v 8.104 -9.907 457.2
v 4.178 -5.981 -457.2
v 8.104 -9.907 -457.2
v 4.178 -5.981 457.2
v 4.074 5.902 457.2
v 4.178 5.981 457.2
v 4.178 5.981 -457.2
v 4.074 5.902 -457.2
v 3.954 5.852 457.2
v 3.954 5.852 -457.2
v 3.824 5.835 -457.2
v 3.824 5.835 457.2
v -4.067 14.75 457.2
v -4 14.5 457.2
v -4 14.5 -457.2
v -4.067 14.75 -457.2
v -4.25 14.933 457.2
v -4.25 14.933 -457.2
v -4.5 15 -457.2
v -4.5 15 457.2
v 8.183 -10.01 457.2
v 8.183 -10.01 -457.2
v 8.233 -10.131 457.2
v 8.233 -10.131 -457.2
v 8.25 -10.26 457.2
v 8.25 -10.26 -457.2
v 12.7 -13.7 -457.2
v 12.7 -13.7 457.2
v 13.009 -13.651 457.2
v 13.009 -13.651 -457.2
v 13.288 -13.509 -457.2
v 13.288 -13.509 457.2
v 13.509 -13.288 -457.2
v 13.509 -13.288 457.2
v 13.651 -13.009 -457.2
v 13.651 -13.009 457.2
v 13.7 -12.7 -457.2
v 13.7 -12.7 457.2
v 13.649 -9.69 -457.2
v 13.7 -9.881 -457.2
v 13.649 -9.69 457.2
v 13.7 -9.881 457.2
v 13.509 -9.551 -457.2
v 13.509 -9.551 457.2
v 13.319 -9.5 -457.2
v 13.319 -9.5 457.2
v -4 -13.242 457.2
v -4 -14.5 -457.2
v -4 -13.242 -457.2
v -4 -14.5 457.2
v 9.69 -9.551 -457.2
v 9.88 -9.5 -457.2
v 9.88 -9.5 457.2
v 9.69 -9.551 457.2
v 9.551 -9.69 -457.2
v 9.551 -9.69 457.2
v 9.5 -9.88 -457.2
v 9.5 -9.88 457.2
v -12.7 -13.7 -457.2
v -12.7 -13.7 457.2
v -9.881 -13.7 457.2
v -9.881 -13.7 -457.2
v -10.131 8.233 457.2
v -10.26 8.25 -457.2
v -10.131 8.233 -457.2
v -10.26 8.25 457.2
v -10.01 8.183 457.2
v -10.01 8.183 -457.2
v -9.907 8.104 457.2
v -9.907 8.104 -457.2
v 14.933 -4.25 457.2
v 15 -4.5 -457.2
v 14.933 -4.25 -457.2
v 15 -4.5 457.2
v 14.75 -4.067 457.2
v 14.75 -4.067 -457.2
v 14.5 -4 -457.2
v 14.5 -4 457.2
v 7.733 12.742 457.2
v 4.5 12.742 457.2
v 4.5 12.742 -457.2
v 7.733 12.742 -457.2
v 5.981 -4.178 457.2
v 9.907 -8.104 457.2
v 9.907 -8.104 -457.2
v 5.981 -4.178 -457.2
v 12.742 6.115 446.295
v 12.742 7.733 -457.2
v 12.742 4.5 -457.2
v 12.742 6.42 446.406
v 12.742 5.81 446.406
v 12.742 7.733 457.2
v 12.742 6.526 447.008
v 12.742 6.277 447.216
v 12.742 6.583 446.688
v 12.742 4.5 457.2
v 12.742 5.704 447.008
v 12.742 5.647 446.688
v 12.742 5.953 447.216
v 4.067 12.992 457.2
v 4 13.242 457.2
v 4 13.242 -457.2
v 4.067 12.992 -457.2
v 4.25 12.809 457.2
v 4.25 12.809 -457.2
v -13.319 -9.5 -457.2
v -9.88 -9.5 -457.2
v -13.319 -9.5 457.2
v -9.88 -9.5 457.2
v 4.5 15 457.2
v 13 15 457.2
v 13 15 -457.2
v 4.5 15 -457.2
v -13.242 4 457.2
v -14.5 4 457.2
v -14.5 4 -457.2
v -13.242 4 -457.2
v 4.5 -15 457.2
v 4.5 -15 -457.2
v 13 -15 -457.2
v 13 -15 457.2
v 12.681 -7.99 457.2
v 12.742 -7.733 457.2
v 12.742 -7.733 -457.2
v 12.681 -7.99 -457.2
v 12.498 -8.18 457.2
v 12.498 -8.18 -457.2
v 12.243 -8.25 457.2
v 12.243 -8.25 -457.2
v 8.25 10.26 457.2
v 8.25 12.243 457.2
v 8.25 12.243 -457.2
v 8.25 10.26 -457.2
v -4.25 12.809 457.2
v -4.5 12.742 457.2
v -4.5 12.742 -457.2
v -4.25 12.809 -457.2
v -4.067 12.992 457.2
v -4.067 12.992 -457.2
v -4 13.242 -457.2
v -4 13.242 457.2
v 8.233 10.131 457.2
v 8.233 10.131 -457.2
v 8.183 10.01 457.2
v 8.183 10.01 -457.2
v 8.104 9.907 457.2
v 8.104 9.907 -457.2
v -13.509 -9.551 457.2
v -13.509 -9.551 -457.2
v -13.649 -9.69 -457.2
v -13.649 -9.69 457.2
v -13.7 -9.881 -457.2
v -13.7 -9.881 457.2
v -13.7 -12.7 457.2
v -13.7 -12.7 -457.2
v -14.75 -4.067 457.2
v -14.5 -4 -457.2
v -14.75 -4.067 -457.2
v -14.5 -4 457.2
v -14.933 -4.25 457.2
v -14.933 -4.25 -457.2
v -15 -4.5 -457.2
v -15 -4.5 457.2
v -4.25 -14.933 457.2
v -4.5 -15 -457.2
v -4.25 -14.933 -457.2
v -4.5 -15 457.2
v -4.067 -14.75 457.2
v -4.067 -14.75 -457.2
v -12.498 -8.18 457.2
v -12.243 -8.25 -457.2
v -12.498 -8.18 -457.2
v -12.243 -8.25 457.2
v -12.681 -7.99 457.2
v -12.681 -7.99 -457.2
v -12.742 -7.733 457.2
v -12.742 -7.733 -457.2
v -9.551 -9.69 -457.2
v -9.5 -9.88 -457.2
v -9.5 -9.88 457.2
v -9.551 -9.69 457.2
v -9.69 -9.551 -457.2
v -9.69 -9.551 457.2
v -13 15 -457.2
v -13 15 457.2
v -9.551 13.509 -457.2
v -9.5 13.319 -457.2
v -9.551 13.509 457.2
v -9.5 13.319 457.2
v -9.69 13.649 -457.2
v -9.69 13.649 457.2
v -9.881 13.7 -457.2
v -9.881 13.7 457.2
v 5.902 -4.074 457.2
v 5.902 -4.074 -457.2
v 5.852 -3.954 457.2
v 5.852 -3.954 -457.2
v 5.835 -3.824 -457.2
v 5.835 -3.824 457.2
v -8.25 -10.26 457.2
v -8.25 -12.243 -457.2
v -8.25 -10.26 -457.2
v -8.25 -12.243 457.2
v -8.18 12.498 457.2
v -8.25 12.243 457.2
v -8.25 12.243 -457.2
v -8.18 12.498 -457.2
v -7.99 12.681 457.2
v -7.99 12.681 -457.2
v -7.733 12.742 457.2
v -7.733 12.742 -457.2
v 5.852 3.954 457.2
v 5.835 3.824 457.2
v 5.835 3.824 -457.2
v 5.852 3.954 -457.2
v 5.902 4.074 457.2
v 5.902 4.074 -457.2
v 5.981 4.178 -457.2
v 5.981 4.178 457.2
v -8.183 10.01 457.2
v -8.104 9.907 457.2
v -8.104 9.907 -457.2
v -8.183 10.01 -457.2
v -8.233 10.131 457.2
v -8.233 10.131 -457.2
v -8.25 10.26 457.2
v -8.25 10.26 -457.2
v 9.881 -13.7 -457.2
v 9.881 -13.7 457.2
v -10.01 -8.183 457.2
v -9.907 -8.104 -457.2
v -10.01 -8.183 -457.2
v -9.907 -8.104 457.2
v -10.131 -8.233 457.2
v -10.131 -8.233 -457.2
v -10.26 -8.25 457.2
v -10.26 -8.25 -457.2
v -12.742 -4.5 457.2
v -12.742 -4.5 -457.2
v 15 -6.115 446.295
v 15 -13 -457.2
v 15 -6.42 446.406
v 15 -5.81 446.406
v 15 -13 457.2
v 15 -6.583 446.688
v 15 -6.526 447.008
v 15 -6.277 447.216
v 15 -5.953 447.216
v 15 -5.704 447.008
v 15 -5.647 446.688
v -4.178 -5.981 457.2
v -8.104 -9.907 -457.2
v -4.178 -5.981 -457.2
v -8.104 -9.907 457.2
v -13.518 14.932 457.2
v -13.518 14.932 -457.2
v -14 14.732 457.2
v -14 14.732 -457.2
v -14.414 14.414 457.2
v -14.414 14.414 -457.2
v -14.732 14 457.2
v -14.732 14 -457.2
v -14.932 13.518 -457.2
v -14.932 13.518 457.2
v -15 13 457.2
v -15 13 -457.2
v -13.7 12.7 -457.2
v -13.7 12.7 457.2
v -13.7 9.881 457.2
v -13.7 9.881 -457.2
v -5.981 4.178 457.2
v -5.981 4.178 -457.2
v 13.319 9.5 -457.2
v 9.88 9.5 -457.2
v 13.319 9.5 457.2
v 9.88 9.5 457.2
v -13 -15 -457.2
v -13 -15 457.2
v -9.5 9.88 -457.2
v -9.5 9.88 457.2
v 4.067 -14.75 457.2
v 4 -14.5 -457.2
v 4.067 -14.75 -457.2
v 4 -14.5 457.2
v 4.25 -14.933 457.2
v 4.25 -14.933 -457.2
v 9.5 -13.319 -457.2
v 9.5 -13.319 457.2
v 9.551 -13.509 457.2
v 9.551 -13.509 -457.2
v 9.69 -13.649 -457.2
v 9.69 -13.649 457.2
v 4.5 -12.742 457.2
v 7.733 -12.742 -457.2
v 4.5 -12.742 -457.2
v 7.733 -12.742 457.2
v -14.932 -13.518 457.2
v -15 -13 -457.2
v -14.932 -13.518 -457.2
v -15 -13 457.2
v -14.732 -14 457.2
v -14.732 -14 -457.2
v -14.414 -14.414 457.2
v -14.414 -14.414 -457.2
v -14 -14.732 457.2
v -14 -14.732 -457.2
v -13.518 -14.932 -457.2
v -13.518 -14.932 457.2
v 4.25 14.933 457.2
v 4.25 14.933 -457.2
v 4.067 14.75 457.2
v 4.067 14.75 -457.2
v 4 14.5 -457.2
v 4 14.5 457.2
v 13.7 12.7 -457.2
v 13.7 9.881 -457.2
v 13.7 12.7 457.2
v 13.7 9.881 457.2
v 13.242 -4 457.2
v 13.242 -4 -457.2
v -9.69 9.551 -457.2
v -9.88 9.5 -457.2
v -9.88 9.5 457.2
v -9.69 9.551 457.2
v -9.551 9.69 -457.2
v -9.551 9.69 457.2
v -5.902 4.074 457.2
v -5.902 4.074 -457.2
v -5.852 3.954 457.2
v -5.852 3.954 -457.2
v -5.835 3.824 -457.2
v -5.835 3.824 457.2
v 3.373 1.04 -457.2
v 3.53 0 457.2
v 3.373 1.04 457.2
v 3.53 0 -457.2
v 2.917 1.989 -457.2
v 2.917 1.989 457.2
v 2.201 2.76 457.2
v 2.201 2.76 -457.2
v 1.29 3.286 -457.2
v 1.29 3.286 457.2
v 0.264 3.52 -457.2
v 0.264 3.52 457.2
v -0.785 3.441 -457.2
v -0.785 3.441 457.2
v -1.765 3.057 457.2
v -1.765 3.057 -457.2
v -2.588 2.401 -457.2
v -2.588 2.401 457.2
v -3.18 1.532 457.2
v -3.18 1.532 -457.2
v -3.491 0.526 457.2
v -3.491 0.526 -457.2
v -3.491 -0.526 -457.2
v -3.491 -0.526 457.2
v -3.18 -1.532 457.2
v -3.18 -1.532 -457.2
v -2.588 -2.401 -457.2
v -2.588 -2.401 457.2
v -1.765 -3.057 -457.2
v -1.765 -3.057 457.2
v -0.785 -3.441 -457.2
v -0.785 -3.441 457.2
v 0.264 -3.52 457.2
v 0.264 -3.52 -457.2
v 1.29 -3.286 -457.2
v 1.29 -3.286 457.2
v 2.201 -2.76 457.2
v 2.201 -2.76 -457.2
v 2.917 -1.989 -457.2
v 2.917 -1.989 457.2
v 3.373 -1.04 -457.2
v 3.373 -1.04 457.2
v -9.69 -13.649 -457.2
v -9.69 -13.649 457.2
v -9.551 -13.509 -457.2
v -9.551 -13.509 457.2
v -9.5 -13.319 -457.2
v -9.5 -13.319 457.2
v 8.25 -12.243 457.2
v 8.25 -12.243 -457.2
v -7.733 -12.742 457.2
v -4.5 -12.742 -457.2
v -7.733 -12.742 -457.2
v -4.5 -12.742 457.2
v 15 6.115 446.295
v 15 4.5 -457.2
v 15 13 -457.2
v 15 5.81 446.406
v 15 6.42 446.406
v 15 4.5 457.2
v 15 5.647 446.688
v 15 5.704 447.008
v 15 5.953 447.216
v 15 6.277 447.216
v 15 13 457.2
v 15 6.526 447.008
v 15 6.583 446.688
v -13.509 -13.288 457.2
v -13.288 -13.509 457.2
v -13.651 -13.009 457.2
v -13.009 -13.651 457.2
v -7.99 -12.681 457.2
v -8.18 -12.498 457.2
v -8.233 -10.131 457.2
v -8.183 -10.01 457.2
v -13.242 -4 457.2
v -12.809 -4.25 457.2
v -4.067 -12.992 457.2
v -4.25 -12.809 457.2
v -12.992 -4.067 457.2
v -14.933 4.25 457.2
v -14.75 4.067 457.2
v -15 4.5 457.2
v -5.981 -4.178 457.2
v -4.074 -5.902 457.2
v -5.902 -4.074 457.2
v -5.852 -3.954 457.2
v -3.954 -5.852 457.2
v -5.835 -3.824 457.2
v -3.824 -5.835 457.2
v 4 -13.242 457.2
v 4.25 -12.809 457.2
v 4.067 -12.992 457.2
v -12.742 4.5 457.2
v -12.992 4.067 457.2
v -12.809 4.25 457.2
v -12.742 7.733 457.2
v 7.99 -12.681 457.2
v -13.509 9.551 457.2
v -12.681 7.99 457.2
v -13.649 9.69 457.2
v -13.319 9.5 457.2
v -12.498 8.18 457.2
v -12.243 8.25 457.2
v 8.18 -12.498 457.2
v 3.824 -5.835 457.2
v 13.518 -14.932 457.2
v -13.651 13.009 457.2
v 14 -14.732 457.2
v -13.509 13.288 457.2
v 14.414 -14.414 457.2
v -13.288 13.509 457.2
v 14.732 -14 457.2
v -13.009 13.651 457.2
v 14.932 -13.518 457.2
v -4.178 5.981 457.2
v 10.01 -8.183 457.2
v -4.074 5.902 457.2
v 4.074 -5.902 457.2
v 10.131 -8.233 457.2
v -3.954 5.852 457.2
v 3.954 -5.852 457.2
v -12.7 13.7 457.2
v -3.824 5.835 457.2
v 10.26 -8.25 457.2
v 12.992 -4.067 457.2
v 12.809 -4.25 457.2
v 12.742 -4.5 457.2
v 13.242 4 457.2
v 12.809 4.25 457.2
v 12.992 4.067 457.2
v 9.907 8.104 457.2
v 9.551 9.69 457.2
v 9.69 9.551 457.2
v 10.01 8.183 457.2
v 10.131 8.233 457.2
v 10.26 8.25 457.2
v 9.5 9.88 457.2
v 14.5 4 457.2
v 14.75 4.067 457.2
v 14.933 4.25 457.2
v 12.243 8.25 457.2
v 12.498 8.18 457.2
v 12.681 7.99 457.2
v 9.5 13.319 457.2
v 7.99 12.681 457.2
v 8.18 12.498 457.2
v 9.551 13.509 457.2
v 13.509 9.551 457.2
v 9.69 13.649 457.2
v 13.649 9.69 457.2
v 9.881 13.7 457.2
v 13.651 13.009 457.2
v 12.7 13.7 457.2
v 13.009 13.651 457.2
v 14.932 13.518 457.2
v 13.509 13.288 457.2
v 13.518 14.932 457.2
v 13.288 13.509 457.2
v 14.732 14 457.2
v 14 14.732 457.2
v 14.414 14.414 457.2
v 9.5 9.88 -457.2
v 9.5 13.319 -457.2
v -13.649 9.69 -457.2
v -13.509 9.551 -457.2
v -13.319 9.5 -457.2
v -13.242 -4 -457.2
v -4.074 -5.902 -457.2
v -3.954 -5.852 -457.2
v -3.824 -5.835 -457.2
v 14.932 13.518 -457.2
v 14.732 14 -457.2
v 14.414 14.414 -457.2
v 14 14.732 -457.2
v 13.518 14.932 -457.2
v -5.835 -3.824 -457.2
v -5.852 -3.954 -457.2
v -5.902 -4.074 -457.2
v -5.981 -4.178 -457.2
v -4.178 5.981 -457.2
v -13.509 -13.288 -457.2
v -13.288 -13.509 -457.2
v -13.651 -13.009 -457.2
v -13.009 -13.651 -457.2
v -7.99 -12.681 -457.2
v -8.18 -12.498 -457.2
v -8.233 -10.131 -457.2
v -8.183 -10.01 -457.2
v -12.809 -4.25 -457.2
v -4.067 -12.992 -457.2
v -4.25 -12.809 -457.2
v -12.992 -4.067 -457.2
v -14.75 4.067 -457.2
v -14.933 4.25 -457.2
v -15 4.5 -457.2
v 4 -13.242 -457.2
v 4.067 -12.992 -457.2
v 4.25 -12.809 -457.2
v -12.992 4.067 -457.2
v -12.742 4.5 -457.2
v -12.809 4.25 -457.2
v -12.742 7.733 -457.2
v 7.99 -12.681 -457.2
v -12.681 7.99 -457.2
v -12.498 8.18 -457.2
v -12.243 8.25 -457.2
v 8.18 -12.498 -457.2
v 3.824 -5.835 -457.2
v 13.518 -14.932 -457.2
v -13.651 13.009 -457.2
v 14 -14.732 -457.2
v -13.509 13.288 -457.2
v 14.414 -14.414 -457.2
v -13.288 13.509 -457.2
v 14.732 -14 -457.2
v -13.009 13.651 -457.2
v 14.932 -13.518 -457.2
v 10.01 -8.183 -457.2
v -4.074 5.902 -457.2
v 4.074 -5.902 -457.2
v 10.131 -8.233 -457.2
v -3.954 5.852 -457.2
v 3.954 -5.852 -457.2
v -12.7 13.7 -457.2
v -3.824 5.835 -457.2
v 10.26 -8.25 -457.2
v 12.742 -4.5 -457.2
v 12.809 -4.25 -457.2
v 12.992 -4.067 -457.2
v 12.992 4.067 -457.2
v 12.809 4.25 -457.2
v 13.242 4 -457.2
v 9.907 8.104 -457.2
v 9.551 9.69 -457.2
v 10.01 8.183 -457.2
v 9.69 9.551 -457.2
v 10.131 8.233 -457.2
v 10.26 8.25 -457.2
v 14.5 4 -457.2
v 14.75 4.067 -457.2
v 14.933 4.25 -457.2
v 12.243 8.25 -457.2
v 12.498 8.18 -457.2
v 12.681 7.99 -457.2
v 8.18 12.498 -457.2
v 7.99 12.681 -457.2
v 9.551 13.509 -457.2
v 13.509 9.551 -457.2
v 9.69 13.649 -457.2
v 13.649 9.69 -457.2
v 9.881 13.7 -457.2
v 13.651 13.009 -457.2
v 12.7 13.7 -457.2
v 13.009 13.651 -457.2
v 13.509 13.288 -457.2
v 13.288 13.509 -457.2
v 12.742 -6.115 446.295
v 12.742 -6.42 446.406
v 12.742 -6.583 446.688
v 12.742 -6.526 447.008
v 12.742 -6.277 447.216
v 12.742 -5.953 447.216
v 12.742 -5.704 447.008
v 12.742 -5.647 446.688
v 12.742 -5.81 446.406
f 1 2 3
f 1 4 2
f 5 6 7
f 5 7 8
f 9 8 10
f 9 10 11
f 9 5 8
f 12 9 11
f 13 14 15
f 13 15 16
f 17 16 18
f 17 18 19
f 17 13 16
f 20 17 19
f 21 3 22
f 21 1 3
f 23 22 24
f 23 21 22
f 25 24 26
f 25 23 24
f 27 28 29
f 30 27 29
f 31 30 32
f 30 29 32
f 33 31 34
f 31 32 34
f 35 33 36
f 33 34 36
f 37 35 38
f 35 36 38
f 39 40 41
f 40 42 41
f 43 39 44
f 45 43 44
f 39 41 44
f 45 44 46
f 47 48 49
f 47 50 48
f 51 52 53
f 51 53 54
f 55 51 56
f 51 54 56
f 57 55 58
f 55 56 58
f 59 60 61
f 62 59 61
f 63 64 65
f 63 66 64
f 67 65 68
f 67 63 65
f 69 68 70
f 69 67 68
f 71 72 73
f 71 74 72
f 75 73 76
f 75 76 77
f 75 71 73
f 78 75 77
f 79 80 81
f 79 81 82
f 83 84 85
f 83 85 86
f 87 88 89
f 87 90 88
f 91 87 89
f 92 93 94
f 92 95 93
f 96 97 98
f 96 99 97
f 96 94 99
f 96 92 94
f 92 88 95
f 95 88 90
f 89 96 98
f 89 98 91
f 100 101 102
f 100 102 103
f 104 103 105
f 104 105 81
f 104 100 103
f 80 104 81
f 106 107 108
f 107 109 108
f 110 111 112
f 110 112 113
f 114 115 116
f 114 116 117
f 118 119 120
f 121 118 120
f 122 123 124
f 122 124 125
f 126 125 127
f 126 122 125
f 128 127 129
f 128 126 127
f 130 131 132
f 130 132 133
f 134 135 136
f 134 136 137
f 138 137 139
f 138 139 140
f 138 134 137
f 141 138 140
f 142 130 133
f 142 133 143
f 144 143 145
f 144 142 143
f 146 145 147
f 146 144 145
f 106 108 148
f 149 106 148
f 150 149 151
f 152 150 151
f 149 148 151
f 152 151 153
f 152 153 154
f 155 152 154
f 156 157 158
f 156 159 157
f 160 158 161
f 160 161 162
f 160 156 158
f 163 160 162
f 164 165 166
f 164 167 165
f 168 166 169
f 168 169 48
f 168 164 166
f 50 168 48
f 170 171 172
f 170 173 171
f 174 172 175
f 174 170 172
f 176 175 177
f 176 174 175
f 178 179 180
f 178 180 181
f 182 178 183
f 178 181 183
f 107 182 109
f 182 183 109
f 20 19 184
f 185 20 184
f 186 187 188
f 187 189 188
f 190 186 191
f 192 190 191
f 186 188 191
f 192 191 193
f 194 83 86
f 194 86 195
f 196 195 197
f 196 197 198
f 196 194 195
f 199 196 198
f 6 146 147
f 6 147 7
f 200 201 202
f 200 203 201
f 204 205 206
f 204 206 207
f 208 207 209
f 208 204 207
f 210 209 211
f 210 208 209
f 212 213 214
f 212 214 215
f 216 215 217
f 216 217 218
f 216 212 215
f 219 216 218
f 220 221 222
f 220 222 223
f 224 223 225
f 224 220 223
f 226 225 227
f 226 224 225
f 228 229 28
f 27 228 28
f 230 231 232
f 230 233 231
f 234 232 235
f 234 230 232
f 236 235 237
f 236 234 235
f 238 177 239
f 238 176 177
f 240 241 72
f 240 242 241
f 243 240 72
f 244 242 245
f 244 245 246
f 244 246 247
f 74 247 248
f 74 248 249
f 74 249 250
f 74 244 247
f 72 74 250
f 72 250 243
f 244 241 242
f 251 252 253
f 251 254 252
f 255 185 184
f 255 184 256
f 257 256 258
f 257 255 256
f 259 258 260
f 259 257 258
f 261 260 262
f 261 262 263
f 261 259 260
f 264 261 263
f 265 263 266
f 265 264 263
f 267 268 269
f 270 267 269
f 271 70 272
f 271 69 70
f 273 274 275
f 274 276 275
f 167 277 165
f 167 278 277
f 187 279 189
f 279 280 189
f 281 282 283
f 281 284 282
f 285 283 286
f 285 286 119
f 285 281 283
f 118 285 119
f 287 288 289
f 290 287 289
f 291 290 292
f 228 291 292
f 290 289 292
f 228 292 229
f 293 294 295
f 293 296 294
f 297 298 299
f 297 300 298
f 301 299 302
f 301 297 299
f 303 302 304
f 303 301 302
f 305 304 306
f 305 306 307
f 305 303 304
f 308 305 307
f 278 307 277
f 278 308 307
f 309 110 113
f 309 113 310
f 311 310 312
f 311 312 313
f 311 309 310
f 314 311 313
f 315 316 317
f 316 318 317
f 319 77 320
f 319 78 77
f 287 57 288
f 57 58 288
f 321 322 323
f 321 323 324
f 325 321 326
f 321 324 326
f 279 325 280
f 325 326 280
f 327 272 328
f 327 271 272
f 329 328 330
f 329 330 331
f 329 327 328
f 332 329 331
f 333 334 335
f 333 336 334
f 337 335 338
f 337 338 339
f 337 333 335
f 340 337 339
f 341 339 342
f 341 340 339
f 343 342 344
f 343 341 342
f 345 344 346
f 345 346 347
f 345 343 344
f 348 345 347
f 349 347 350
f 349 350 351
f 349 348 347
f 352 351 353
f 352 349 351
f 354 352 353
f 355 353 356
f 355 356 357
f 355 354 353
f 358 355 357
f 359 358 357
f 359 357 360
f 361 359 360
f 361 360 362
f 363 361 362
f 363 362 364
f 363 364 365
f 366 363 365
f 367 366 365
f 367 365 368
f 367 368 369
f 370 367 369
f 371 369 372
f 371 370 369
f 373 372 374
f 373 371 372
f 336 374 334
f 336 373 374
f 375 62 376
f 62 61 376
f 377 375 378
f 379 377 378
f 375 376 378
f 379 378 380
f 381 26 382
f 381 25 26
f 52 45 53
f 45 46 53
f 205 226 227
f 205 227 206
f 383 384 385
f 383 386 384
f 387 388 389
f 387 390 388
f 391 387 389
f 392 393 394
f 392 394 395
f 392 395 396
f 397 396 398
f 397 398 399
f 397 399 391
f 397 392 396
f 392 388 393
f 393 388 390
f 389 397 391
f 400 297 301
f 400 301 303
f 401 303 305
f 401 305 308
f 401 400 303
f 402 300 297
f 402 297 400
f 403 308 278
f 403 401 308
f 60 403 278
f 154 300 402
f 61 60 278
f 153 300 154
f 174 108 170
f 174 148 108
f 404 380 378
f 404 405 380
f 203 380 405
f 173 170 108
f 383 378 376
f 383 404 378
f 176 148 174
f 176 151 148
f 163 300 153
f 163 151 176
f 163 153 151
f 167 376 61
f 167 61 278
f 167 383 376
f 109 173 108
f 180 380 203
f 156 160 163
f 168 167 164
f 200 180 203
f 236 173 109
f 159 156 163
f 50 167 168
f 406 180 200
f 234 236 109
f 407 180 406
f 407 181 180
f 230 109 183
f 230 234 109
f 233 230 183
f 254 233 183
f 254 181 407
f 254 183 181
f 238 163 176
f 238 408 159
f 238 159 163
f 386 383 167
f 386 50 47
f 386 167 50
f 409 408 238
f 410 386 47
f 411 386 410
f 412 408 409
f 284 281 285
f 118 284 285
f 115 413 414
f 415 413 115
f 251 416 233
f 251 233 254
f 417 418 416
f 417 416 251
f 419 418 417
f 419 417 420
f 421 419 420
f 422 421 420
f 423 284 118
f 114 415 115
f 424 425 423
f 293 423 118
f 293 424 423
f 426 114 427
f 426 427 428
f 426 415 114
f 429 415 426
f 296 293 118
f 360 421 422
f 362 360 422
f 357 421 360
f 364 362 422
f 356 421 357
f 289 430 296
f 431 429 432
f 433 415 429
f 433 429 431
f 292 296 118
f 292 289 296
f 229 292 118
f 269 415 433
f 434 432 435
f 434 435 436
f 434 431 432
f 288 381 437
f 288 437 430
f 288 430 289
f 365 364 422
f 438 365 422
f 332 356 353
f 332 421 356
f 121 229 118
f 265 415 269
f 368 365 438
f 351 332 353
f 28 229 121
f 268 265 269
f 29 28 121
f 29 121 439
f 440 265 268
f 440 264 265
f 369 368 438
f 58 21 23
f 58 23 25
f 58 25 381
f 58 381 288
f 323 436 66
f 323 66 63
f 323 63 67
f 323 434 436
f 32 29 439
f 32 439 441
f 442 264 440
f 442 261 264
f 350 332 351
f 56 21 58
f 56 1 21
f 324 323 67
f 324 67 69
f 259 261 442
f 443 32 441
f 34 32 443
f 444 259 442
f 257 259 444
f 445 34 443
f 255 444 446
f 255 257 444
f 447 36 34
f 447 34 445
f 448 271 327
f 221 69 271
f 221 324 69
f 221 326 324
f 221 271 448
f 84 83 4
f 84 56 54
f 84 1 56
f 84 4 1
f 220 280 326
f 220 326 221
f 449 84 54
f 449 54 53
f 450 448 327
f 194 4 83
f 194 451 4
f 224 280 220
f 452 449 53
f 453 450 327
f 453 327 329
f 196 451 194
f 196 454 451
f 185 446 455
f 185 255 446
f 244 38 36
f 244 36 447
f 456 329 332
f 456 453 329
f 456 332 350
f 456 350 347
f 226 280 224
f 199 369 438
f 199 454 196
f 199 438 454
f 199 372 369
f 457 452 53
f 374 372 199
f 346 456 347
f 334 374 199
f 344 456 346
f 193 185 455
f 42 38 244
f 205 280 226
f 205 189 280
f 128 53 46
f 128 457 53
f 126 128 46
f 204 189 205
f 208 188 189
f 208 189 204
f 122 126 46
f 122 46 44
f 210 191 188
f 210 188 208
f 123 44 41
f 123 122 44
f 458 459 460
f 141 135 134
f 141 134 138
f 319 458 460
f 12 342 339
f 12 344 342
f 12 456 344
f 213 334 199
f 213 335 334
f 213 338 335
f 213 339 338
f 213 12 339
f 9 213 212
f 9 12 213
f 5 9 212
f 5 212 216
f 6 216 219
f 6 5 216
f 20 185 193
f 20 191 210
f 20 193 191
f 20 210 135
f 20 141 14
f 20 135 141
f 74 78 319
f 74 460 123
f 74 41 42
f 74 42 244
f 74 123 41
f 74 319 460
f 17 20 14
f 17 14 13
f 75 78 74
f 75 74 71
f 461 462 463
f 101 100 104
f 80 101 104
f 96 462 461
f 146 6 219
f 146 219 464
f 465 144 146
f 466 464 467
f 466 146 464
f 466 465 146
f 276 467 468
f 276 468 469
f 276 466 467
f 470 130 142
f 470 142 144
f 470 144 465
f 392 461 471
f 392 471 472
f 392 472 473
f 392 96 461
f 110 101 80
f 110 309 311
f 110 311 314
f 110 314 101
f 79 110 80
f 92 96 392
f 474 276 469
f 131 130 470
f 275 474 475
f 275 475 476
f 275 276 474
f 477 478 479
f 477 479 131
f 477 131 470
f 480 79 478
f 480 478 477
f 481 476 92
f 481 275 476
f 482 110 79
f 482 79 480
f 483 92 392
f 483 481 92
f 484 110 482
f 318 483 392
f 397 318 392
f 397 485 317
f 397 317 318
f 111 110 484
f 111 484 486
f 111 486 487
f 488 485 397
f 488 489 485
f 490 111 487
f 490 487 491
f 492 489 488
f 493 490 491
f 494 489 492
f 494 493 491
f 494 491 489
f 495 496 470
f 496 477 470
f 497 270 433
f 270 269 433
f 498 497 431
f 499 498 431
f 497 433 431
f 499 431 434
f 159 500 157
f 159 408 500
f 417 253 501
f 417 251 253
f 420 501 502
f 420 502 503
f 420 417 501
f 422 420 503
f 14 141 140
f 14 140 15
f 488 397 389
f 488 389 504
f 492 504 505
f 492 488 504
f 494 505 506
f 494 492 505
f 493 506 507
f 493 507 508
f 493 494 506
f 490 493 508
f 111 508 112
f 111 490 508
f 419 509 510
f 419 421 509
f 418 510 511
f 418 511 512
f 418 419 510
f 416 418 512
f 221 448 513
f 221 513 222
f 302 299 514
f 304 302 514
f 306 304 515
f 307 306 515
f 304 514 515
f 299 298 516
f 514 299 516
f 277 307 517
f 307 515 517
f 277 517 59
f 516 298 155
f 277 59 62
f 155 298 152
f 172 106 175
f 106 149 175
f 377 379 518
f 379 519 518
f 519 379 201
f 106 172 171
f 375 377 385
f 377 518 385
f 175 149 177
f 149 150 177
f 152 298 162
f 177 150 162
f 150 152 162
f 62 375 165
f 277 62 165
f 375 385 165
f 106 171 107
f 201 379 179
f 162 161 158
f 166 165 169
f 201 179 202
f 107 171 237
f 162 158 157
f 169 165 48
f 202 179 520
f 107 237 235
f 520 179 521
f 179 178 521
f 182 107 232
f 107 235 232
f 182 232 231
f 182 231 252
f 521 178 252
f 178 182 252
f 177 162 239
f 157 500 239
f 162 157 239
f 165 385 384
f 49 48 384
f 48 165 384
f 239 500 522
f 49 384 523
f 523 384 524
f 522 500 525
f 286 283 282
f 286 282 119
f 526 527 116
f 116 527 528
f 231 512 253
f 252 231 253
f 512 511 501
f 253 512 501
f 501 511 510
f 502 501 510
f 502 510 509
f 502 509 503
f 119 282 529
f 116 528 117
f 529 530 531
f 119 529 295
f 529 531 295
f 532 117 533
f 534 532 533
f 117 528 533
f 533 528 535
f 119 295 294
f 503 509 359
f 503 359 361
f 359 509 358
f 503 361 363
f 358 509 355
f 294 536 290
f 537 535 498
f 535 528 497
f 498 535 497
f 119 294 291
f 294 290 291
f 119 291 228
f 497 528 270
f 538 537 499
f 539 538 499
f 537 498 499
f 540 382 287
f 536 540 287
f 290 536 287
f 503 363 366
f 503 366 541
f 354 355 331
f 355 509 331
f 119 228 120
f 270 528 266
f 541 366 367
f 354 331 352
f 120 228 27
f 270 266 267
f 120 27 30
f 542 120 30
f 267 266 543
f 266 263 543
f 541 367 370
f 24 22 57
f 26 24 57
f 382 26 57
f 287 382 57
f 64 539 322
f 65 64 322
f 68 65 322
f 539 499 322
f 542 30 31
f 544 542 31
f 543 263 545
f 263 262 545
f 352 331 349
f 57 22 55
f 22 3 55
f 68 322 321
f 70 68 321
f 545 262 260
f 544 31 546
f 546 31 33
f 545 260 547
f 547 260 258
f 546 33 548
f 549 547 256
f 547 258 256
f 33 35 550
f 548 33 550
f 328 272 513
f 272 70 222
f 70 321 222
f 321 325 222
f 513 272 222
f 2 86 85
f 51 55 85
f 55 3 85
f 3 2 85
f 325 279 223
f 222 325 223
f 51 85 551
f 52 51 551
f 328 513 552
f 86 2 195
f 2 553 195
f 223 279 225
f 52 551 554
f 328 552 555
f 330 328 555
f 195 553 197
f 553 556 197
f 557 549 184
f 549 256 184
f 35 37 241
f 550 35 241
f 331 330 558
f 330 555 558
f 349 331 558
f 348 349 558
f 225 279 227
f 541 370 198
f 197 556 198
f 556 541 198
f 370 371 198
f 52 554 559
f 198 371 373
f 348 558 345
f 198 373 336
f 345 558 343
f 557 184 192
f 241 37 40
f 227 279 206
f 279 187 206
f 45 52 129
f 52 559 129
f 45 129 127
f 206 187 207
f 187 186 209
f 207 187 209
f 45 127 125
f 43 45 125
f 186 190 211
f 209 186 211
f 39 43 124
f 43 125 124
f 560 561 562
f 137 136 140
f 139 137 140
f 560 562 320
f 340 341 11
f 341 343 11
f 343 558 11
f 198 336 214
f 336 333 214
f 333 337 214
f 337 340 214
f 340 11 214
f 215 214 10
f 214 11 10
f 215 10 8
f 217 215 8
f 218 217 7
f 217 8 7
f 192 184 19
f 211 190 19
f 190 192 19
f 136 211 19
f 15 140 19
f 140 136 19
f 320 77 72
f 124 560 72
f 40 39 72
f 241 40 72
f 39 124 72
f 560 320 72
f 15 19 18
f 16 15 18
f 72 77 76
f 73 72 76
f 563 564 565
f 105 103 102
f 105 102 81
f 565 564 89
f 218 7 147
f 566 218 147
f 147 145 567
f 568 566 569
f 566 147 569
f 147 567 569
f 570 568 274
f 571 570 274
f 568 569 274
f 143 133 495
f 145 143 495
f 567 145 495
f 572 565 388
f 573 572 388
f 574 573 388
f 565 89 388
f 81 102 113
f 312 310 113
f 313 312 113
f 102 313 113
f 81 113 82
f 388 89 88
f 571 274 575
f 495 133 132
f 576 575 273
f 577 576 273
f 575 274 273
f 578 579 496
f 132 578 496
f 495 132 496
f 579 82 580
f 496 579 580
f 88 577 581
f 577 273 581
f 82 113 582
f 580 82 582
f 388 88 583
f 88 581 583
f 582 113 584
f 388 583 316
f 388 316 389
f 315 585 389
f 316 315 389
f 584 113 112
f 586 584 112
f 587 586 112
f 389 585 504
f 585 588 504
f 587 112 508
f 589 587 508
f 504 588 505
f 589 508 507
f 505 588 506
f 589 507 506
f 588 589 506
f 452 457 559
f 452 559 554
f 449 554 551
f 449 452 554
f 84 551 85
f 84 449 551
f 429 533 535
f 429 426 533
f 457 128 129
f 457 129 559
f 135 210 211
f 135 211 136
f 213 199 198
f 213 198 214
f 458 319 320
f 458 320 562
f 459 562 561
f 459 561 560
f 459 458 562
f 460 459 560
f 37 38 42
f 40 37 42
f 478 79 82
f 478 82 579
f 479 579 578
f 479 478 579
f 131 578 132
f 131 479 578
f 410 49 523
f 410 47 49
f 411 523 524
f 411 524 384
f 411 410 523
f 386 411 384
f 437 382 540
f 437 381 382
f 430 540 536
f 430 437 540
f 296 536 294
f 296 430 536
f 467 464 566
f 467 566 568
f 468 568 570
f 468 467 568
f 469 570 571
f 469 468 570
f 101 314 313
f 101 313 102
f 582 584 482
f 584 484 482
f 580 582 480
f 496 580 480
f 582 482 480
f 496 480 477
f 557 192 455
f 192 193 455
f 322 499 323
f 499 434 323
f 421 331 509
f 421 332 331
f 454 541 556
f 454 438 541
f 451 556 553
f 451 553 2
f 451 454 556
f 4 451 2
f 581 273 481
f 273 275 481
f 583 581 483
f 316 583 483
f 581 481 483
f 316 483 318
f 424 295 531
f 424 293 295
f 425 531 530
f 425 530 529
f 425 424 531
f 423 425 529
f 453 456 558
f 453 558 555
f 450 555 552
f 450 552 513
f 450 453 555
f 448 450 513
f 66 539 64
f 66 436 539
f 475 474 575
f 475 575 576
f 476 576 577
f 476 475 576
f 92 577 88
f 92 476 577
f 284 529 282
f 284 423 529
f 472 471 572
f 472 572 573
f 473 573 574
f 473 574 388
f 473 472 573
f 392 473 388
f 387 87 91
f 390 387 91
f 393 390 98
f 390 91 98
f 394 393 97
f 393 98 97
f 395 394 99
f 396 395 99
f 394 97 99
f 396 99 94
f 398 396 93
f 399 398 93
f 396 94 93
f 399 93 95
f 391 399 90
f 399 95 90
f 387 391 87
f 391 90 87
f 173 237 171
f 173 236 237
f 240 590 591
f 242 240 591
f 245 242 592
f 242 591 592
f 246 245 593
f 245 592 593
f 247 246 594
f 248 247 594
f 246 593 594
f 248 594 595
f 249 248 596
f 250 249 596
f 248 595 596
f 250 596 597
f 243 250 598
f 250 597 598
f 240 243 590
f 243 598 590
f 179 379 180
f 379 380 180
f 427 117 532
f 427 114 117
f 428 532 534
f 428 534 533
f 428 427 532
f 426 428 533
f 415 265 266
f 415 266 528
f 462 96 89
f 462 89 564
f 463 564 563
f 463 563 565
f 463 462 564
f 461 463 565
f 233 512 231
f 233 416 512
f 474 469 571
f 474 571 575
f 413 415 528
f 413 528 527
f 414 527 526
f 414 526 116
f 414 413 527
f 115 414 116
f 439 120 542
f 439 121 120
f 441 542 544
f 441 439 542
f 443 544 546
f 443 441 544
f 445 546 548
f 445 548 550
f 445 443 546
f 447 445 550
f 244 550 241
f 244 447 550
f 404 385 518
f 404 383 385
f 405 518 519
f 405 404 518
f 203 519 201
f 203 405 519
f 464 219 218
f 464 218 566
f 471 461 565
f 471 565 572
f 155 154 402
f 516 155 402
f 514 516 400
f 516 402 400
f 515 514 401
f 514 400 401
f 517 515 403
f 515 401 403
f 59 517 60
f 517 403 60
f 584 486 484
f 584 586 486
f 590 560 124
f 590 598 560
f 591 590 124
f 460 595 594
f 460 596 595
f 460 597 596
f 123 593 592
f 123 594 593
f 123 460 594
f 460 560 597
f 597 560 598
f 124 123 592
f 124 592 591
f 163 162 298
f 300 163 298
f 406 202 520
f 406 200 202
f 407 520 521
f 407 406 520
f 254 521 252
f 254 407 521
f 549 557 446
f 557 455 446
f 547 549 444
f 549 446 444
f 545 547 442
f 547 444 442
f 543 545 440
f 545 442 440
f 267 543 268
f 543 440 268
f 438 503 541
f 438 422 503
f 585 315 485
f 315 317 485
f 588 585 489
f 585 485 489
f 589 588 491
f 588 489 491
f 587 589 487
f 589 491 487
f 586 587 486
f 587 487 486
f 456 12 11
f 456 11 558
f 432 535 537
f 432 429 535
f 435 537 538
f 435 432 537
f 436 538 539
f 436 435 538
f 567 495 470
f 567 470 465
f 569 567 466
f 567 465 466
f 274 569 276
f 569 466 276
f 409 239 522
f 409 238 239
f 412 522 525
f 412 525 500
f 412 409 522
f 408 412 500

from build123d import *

# Parameters (mm, degrees)
SKETCH1_R                    = 3.52998588
BOSS_EXTRUDE1_DEPTH          = 457.2
M1_2X0_25_TAPPED_HOLE1_D     = 0.95
M1_2X0_25_TAPPED_HOLE1_DEPTH = 2.25746535


with BuildPart() as part:
    # Sketch1 → Boss-Extrude1 (new, symmetric)
    with BuildSketch(Plane.XY):
        with BuildLine():
            Line((14.49994, -4), (13.24247465, -4))
            ThreePointArc((13.24247465, -4), (12.88892126, -4.146446609), (12.74247465, -4.5))
            Line((12.74247465, -4.5), (12.74247465, -7.732519321))
            ThreePointArc((12.74247465, -7.732519321), (12.602449697, -8.097296796), (12.242781236, -8.249967))
            Line((12.242781236, -8.249967), (10.260188032, -8.249967))
            ThreePointArc((10.260188032, -8.249967), (10.068847082, -8.211906919), (9.906636056, -8.103520976))
            Line((9.906636056, -8.103520976), (5.981117769, -4.178002689))
            ThreePointArc((5.981117769, -4.178002689), (5.872731827, -4.015791664), (5.834671745, -3.824450713))
            Line((5.834671745, -3.824450713), (5.834671745, -1.01249595))
            Line((5.834671745, -1.01249595), (5.834671745, 0.88749645))
            Line((5.834671745, 0.88749645), (5.834671745, 3.824450713))
            ThreePointArc((5.834671745, 3.824450713), (5.872731827, 4.015791664), (5.981117769, 4.178002689))
            Line((5.981117769, 4.178002689), (9.906636056, 8.103520976))
            ThreePointArc((9.906636056, 8.103520976), (10.068847082, 8.211906919), (10.260188032, 8.249967))
            Line((10.260188032, 8.249967), (12.242781236, 8.249967))
            ThreePointArc((12.242781236, 8.249967), (12.602449697, 8.097296796), (12.74247465, 7.732519321))
            Line((12.74247465, 7.732519321), (12.74247465, 4.5))
            ThreePointArc((12.74247465, 4.5), (12.88892126, 4.146446609), (13.24247465, 4))
            Line((13.24247465, 4), (14.49994, 4))
            ThreePointArc((14.49994, 4), (14.853493391, 4.146446609), (14.99994, 4.5))
            Line((14.99994, 4.5), (14.99994, 12.999948))
            ThreePointArc((14.99994, 12.999948), (14.414155906, 14.414155906), (12.999948, 14.99994))
            Line((12.999948, 14.99994), (4.5, 14.99994))
            ThreePointArc((4.5, 14.99994), (4.146446609, 14.853493391), (4, 14.49994))
            Line((4, 14.49994), (4, 13.24247465))
            ThreePointArc((4, 13.24247465), (4.146446609, 12.88892126), (4.5, 12.74247465))
            Line((4.5, 12.74247465), (7.732519321, 12.74247465))
            ThreePointArc((7.732519321, 12.74247465), (8.097296796, 12.602449697), (8.249967, 12.242781236))
            Line((8.249967, 12.242781236), (8.249967, 10.260188032))
            ThreePointArc((8.249967, 10.260188032), (8.211906919, 10.068847082), (8.103520976, 9.906636056))
            Line((8.103520976, 9.906636056), (4.178002689, 5.981117769))
            ThreePointArc((4.178002689, 5.981117769), (4.015791664, 5.872731827), (3.824450713, 5.834671745))
            Line((3.824450713, 5.834671745), (0.9499962, 5.834671745))
            Line((0.9499962, 5.834671745), (-0.9499962, 5.834671745))
            Line((-0.9499962, 5.834671745), (-3.824450713, 5.834671745))
            ThreePointArc((-3.824450713, 5.834671745), (-4.015791664, 5.872731827), (-4.178002689, 5.981117769))
            Line((-4.178002689, 5.981117769), (-8.103520976, 9.906636056))
            ThreePointArc((-8.103520976, 9.906636056), (-8.211906919, 10.068847082), (-8.249967, 10.260188032))
            Line((-8.249967, 10.260188032), (-8.249967, 12.242781236))
            ThreePointArc((-8.249967, 12.242781236), (-8.097296796, 12.602449697), (-7.732519321, 12.74247465))
            Line((-7.732519321, 12.74247465), (-4.5, 12.74247465))
            ThreePointArc((-4.5, 12.74247465), (-4.146446609, 12.88892126), (-4, 13.24247465))
            Line((-4, 13.24247465), (-4, 14.49994))
            ThreePointArc((-4, 14.49994), (-4.146446609, 14.853493391), (-4.5, 14.99994))
            Line((-4.5, 14.99994), (-12.999948, 14.99994))
            ThreePointArc((-12.999948, 14.99994), (-14.414155906, 14.414155906), (-14.99994, 12.999948))
            Line((-14.99994, 12.999948), (-14.99994, 4.5))
            ThreePointArc((-14.99994, 4.5), (-14.853493391, 4.146446609), (-14.49994, 4))
            Line((-14.49994, 4), (-13.24247465, 4))
            ThreePointArc((-13.24247465, 4), (-12.88892126, 4.146446609), (-12.74247465, 4.5))
            Line((-12.74247465, 4.5), (-12.74247465, 7.732519321))
            ThreePointArc((-12.74247465, 7.732519321), (-12.602449697, 8.097296796), (-12.242781236, 8.249967))
            Line((-12.242781236, 8.249967), (-10.260188032, 8.249967))
            ThreePointArc((-10.260188032, 8.249967), (-10.068847082, 8.211906919), (-9.906636056, 8.103520976))
            Line((-9.906636056, 8.103520976), (-5.981117769, 4.178002689))
            ThreePointArc((-5.981117769, 4.178002689), (-5.872731827, 4.015791664), (-5.834671745, 3.824450713))
            Line((-5.834671745, 3.824450713), (-5.834671745, 0.88749645))
            Line((-5.834671745, 0.88749645), (-5.834671745, -1.01249595))
            Line((-5.834671745, -1.01249595), (-5.834671745, -3.824450713))
            ThreePointArc((-5.834671745, -3.824450713), (-5.872731827, -4.015791664), (-5.981117769, -4.178002689))
            Line((-5.981117769, -4.178002689), (-9.906636056, -8.103520976))
            ThreePointArc((-9.906636056, -8.103520976), (-10.068847082, -8.211906919), (-10.260188032, -8.249967))
            Line((-10.260188032, -8.249967), (-12.242781236, -8.249967))
            ThreePointArc((-12.242781236, -8.249967), (-12.602449697, -8.097296796), (-12.74247465, -7.732519321))
            Line((-12.74247465, -7.732519321), (-12.74247465, -4.5))
            ThreePointArc((-12.74247465, -4.5), (-12.88892126, -4.146446609), (-13.24247465, -4))
            Line((-13.24247465, -4), (-14.49994, -4))
            ThreePointArc((-14.49994, -4), (-14.853493391, -4.146446609), (-14.99994, -4.5))
            Line((-14.99994, -4.5), (-14.99994, -12.999948))
            ThreePointArc((-14.99994, -12.999948), (-14.414155906, -14.414155906), (-12.999948, -14.99994))
            Line((-12.999948, -14.99994), (-4.5, -14.99994))
            ThreePointArc((-4.5, -14.99994), (-4.146446609, -14.853493391), (-4, -14.49994))
            Line((-4, -14.49994), (-4, -13.24247465))
            ThreePointArc((-4, -13.24247465), (-4.146446609, -12.88892126), (-4.5, -12.74247465))
            Line((-4.5, -12.74247465), (-7.732519321, -12.74247465))
            ThreePointArc((-7.732519321, -12.74247465), (-8.097296796, -12.602449697), (-8.249967, -12.242781236))
            Line((-8.249967, -12.242781236), (-8.249967, -10.260188032))
            ThreePointArc((-8.249967, -10.260188032), (-8.211906919, -10.068847082), (-8.103520976, -9.906636056))
            Line((-8.103520976, -9.906636056), (-4.178002689, -5.981117769))
            ThreePointArc((-4.178002689, -5.981117769), (-4.015791664, -5.872731827), (-3.824450713, -5.834671745))
            Line((-3.824450713, -5.834671745), (-0.9499962, -5.834671745))
            Line((-0.9499962, -5.834671745), (0.9499962, -5.834671745))
            Line((0.9499962, -5.834671745), (3.824450713, -5.834671745))
            ThreePointArc((3.824450713, -5.834671745), (4.015791664, -5.872731827), (4.178002689, -5.981117769))
            Line((4.178002689, -5.981117769), (8.103520976, -9.906636056))
            ThreePointArc((8.103520976, -9.906636056), (8.211906919, -10.068847082), (8.249967, -10.260188032))
            Line((8.249967, -10.260188032), (8.249967, -12.242781236))
            ThreePointArc((8.249967, -12.242781236), (8.097296796, -12.602449697), (7.732519321, -12.74247465))
            Line((7.732519321, -12.74247465), (4.5, -12.74247465))
            ThreePointArc((4.5, -12.74247465), (4.146446609, -12.88892126), (4, -13.24247465))
            Line((4, -13.24247465), (4, -14.49994))
            ThreePointArc((4, -14.49994), (4.146446609, -14.853493391), (4.5, -14.99994))
            Line((4.5, -14.99994), (12.999948, -14.99994))
            ThreePointArc((12.999948, -14.99994), (14.414155906, -14.414155906), (14.99994, -12.999948))
            Line((14.99994, -12.999948), (14.99994, -4.5))
            ThreePointArc((14.99994, -4.5), (14.853493391, -4.146446609), (14.49994, -4))
        make_face()
        Circle(SKETCH1_R, mode=Mode.SUBTRACT)
        with BuildLine():
            Line((-12.6999492, -13.6999452), (-9.880960476, -13.6999452))
            ThreePointArc((-9.880960476, -13.6999452), (-9.61155387, -13.58835333), (-9.499962, -13.318946724))
            Line((-9.499962, -13.318946724), (-9.499962, -9.87996048))
            ThreePointArc((-9.499962, -9.87996048), (-9.611260978, -9.611260978), (-9.87996048, -9.499962))
            Line((-9.87996048, -9.499962), (-13.318946724, -9.499962))
            ThreePointArc((-13.318946724, -9.499962), (-13.58835333, -9.61155387), (-13.6999452, -9.880960476))
            Line((-13.6999452, -9.880960476), (-13.6999452, -12.6999492))
            ThreePointArc((-13.6999452, -12.6999492), (-13.407053153, -13.407053153), (-12.6999492, -13.6999452))
        make_face(mode=Mode.SUBTRACT)
        with BuildLine():
            Line((13.6999452, -12.6999492), (13.6999452, -9.880960476))
            ThreePointArc((13.6999452, -9.880960476), (13.58835333, -9.61155387), (13.318946724, -9.499962))
            Line((13.318946724, -9.499962), (9.87996048, -9.499962))
            ThreePointArc((9.87996048, -9.499962), (9.611260978, -9.611260978), (9.499962, -9.87996048))
            Line((9.499962, -9.87996048), (9.499962, -13.318946724))
            ThreePointArc((9.499962, -13.318946724), (9.61155387, -13.58835333), (9.880960476, -13.6999452))
            Line((9.880960476, -13.6999452), (12.6999492, -13.6999452))
            ThreePointArc((12.6999492, -13.6999452), (13.407053153, -13.407053153), (13.6999452, -12.6999492))
        make_face(mode=Mode.SUBTRACT)
        with BuildLine():
            Line((9.87996048, 9.499962), (13.318946724, 9.499962))
            ThreePointArc((13.318946724, 9.499962), (13.58835333, 9.61155387), (13.6999452, 9.880960476))
            Line((13.6999452, 9.880960476), (13.6999452, 12.6999492))
            ThreePointArc((13.6999452, 12.6999492), (13.407053153, 13.407053153), (12.6999492, 13.6999452))
            Line((12.6999492, 13.6999452), (9.880960476, 13.6999452))
            ThreePointArc((9.880960476, 13.6999452), (9.61155387, 13.58835333), (9.499962, 13.318946724))
            Line((9.499962, 13.318946724), (9.499962, 9.87996048))
            ThreePointArc((9.499962, 9.87996048), (9.611260978, 9.611260978), (9.87996048, 9.499962))
        make_face(mode=Mode.SUBTRACT)
        with BuildLine():
            Line((-13.6999452, 12.6999492), (-13.6999452, 9.880960476))
            ThreePointArc((-13.6999452, 9.880960476), (-13.58835333, 9.61155387), (-13.318946724, 9.499962))
            Line((-13.318946724, 9.499962), (-9.87996048, 9.499962))
            ThreePointArc((-9.87996048, 9.499962), (-9.611260978, 9.611260978), (-9.499962, 9.87996048))
            Line((-9.499962, 9.87996048), (-9.499962, 13.318946724))
            ThreePointArc((-9.499962, 13.318946724), (-9.61155387, 13.58835333), (-9.880960476, 13.6999452))
            Line((-9.880960476, 13.6999452), (-12.6999492, 13.6999452))
            ThreePointArc((-12.6999492, 13.6999452), (-13.407053153, 13.407053153), (-13.6999452, 12.6999492))
        make_face(mode=Mode.SUBTRACT)
    extrude(amount=BOSS_EXTRUDE1_DEPTH, both=True)

    # M1.2x0.25 Tapped Hole1
    with Locations(Plane(origin=(14.99994, 6.115, 446.77), x_dir=(0, 0, 1), z_dir=(1, 0, 0))):
        with Locations((0, 0), (0, 12.23)):
            Hole(M1_2X0_25_TAPPED_HOLE1_D / 2, depth=M1_2X0_25_TAPPED_HOLE1_DEPTH)


solid = part.part
